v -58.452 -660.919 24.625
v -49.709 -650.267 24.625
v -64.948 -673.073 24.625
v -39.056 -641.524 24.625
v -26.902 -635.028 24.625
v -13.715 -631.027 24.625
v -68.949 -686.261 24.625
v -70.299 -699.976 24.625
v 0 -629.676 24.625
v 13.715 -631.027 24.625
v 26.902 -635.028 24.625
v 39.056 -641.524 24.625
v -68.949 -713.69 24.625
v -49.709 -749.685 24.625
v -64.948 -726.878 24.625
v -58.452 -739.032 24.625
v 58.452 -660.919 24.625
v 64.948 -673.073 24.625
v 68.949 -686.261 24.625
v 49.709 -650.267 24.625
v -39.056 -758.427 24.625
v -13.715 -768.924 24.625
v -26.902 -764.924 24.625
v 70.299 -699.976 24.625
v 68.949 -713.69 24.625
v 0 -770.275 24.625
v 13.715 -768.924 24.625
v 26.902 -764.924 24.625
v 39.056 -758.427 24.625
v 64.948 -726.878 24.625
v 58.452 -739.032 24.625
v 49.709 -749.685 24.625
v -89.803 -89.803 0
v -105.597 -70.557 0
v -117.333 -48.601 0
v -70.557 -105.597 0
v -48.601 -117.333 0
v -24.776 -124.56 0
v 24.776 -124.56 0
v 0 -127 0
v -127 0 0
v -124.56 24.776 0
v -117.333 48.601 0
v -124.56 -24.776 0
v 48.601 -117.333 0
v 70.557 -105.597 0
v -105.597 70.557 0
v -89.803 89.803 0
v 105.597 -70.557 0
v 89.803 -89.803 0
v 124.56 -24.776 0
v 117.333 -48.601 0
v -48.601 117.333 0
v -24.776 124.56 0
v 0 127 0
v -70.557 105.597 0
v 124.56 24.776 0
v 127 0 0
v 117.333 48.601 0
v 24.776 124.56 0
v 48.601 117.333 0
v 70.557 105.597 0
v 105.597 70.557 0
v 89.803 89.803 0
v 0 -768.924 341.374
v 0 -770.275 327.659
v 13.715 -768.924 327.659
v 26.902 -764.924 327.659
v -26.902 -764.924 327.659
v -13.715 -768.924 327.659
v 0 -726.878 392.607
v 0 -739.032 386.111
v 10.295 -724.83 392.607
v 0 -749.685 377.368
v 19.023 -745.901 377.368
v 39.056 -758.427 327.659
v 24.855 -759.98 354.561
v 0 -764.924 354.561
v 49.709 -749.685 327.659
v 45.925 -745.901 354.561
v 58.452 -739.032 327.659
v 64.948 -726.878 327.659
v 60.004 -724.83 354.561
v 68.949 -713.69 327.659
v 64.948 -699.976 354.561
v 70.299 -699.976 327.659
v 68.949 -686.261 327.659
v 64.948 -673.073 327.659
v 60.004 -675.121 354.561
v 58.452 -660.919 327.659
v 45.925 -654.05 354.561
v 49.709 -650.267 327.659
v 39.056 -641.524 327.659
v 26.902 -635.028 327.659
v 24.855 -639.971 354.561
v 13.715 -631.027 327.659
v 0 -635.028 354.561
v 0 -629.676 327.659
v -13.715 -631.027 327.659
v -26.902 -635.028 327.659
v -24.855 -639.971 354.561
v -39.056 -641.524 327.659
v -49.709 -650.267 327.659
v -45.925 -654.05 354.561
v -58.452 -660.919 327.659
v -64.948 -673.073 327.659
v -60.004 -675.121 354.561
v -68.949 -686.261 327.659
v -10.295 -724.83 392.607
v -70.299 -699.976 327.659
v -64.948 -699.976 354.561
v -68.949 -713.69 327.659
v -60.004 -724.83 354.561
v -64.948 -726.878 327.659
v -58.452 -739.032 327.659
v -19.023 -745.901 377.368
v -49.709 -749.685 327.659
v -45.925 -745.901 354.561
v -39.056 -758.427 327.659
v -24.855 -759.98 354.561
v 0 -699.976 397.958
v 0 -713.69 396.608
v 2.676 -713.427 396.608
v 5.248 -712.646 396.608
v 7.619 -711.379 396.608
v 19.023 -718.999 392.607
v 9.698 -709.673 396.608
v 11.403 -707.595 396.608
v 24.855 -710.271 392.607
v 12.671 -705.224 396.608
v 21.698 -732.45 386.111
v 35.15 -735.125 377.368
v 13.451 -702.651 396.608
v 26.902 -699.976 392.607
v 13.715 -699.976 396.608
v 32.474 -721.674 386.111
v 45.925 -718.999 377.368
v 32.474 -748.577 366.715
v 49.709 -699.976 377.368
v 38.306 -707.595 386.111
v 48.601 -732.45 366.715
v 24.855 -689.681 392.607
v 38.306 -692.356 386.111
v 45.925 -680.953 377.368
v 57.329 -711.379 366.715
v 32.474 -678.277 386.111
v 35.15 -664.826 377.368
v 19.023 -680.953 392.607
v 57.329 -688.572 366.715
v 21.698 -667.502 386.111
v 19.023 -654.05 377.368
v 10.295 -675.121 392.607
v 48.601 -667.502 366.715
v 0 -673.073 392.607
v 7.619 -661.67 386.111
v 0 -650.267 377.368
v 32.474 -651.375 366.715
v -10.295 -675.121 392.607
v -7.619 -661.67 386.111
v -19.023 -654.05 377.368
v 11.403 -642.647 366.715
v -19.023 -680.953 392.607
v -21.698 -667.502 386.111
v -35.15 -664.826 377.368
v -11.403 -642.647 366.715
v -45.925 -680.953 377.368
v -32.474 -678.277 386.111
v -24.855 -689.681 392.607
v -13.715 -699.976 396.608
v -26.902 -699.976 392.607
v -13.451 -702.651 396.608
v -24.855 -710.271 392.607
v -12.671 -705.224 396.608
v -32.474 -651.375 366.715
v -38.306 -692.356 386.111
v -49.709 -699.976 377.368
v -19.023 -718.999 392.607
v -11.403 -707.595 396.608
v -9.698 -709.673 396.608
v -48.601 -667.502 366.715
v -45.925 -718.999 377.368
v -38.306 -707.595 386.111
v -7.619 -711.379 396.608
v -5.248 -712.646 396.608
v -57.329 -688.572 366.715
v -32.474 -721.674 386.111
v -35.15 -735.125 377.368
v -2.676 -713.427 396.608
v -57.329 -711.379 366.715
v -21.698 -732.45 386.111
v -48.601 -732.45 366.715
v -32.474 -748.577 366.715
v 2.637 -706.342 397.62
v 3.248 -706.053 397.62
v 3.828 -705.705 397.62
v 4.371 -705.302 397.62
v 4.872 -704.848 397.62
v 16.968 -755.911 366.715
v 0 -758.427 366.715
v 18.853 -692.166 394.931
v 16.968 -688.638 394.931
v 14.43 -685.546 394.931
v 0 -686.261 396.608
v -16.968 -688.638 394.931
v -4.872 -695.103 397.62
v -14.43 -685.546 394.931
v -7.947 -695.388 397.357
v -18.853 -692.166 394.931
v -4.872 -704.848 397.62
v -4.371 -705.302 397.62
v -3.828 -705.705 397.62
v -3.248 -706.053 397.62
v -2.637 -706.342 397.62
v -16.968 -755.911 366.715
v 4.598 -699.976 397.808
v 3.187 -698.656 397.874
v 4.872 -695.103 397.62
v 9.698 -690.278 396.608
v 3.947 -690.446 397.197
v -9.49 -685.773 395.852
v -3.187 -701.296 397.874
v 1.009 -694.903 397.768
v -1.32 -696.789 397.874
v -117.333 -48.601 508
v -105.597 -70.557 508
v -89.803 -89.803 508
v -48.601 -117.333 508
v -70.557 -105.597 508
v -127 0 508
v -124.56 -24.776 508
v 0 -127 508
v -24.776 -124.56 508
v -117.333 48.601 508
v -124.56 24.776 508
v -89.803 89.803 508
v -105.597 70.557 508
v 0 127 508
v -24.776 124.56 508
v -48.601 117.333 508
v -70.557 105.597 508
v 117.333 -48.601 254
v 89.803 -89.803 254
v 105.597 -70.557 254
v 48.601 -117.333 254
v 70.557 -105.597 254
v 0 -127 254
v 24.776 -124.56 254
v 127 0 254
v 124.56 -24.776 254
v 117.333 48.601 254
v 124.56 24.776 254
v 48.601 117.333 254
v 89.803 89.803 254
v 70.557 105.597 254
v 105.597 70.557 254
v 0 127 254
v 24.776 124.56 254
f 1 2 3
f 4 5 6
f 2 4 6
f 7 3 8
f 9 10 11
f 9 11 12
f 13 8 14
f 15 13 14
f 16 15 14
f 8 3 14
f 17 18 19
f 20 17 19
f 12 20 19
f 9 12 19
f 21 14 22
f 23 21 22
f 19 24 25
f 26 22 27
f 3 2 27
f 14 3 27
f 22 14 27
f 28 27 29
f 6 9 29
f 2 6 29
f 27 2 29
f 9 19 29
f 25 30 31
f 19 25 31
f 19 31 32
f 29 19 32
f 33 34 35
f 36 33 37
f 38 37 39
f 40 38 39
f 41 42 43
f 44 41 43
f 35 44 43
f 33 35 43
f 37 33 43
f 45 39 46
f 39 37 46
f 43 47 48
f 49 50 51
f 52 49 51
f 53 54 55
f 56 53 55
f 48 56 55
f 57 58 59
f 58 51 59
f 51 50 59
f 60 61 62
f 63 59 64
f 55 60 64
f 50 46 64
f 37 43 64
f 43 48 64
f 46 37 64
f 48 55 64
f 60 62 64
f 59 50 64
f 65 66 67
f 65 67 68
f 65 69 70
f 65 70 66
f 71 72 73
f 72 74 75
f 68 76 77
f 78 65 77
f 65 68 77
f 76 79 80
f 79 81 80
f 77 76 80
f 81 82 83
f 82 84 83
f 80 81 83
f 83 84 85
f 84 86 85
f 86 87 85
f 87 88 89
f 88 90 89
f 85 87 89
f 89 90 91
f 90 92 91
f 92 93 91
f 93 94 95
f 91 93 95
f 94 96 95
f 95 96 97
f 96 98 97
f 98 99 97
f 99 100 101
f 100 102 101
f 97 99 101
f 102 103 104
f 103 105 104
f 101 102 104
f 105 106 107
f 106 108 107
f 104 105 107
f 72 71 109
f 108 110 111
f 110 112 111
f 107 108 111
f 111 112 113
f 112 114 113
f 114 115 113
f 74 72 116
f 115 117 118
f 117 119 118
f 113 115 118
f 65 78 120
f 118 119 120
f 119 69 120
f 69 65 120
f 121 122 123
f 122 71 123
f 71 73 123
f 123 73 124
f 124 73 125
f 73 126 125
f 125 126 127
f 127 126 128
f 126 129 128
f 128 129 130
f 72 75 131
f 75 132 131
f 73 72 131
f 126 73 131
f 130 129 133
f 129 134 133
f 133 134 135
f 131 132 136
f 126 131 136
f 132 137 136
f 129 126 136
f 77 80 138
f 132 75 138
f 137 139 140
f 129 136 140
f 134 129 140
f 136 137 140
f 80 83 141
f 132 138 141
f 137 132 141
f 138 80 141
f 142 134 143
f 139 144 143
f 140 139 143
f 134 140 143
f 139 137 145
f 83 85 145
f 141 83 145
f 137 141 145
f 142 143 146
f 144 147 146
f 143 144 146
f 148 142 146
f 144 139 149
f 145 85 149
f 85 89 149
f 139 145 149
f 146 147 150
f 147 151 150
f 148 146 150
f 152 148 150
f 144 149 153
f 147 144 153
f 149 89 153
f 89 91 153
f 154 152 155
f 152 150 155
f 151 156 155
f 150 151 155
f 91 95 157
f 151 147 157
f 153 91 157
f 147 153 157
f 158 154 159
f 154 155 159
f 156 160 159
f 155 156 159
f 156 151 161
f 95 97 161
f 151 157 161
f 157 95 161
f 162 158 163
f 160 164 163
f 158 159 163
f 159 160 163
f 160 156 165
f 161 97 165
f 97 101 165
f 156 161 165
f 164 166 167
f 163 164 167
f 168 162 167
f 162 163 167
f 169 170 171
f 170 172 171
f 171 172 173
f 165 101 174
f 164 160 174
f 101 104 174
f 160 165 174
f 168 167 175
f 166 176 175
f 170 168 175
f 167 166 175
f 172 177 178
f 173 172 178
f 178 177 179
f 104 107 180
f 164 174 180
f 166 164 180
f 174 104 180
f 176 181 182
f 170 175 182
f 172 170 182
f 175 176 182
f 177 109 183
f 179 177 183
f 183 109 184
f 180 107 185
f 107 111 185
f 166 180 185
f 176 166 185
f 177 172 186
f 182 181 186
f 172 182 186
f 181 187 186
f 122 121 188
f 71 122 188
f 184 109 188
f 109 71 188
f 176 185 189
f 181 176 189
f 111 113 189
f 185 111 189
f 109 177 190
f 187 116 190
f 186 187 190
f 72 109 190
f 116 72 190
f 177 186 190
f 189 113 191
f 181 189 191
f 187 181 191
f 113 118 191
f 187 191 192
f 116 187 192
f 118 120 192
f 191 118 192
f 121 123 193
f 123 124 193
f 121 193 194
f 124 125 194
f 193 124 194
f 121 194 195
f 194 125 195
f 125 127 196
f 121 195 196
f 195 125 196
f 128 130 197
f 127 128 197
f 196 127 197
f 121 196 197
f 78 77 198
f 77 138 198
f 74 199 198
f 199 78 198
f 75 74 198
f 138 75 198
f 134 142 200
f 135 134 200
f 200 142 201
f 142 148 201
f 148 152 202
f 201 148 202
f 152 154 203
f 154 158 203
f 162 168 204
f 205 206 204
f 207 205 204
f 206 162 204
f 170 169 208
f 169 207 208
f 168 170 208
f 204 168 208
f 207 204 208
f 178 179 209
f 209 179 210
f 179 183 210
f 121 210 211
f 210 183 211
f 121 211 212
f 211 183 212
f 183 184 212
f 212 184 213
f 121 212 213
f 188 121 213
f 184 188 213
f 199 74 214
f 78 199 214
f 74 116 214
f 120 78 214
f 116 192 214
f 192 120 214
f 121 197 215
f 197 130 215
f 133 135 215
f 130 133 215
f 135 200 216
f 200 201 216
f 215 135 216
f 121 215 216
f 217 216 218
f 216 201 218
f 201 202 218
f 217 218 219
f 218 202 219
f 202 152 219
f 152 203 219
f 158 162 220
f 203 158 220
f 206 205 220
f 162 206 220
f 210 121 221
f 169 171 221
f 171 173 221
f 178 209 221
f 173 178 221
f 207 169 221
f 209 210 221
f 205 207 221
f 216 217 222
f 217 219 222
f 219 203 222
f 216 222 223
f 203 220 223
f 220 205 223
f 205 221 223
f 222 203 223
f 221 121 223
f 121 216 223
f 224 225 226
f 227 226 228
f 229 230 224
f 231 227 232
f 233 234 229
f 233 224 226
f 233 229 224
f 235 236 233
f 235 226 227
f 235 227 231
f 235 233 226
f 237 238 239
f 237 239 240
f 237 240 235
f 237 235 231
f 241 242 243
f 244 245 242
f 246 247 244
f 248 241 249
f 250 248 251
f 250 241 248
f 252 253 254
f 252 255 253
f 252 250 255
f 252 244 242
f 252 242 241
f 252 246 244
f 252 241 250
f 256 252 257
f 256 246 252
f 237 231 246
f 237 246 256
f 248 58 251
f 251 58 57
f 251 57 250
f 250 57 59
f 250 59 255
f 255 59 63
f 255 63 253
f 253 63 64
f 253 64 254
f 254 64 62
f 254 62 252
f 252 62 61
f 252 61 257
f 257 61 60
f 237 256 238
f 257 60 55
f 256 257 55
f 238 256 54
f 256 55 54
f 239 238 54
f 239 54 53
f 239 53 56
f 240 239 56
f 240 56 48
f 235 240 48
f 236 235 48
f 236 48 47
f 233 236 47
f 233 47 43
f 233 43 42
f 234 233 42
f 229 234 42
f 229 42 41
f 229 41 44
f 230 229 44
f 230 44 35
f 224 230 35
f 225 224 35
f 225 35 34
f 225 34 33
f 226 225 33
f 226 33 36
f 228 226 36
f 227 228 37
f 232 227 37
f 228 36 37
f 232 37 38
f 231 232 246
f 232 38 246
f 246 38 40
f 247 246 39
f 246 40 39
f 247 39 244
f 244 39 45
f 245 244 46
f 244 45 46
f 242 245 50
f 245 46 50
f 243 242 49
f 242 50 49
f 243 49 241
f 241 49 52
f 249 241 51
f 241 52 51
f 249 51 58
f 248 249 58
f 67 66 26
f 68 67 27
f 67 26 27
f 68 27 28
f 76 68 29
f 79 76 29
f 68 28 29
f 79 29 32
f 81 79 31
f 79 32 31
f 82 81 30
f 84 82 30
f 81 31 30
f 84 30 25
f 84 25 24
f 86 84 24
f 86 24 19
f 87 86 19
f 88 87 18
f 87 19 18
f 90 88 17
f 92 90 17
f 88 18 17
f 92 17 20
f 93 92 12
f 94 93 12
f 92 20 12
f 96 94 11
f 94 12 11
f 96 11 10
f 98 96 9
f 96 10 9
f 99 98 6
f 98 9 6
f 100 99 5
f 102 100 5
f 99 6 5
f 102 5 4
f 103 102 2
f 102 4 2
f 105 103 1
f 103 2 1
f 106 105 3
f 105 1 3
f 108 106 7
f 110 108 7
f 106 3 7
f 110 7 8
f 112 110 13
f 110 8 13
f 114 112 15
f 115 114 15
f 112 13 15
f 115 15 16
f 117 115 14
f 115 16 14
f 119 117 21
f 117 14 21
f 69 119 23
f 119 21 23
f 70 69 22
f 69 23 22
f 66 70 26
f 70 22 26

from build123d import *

# Parameters (mm, degrees)
F0_R     = 127
F1_DEPTH = 508
F2_W     = 411.146572
F2_H     = 425.647633
F3_DEPTH = 127.001


with BuildPart() as f1:
    # F0 (on Top) → F1 (new body)
    with BuildSketch(Plane.XY):
        Circle(F0_R)
    extrude(amount=F1_DEPTH)

    # F2 (on Right) → F3 (cut, through all)
    with BuildSketch(Plane.YZ):
        with Locations((22.096157, 466.823816)):
            Rectangle(F2_W, F2_H)
    extrude(amount=F3_DEPTH, mode=Mode.SUBTRACT)


with BuildPart() as f5:
    # F4 (on Right) → F5 (revolve)
    with BuildSketch(Plane.YZ):
        with BuildLine():
            Line((-699.975669, 327.658981), (-699.975669, 397.958308))
            ThreePointArc((-699.975669, 397.958308), (-749.6848, 377.368112), (-770.274997, 327.658981))
            Line((-770.274997, 327.658981), (-770.274997, 24.624679))
            Line((-770.274997, 24.624679), (-699.975669, 24.624679))
            Line((-699.975669, 24.624679), (-699.975669, 327.658981))
        make_face()
    revolve(axis=Axis((0, -699.975669, 176.14183), (0, 0, 1)))


solid = Compound([f1.part, f5.part])
